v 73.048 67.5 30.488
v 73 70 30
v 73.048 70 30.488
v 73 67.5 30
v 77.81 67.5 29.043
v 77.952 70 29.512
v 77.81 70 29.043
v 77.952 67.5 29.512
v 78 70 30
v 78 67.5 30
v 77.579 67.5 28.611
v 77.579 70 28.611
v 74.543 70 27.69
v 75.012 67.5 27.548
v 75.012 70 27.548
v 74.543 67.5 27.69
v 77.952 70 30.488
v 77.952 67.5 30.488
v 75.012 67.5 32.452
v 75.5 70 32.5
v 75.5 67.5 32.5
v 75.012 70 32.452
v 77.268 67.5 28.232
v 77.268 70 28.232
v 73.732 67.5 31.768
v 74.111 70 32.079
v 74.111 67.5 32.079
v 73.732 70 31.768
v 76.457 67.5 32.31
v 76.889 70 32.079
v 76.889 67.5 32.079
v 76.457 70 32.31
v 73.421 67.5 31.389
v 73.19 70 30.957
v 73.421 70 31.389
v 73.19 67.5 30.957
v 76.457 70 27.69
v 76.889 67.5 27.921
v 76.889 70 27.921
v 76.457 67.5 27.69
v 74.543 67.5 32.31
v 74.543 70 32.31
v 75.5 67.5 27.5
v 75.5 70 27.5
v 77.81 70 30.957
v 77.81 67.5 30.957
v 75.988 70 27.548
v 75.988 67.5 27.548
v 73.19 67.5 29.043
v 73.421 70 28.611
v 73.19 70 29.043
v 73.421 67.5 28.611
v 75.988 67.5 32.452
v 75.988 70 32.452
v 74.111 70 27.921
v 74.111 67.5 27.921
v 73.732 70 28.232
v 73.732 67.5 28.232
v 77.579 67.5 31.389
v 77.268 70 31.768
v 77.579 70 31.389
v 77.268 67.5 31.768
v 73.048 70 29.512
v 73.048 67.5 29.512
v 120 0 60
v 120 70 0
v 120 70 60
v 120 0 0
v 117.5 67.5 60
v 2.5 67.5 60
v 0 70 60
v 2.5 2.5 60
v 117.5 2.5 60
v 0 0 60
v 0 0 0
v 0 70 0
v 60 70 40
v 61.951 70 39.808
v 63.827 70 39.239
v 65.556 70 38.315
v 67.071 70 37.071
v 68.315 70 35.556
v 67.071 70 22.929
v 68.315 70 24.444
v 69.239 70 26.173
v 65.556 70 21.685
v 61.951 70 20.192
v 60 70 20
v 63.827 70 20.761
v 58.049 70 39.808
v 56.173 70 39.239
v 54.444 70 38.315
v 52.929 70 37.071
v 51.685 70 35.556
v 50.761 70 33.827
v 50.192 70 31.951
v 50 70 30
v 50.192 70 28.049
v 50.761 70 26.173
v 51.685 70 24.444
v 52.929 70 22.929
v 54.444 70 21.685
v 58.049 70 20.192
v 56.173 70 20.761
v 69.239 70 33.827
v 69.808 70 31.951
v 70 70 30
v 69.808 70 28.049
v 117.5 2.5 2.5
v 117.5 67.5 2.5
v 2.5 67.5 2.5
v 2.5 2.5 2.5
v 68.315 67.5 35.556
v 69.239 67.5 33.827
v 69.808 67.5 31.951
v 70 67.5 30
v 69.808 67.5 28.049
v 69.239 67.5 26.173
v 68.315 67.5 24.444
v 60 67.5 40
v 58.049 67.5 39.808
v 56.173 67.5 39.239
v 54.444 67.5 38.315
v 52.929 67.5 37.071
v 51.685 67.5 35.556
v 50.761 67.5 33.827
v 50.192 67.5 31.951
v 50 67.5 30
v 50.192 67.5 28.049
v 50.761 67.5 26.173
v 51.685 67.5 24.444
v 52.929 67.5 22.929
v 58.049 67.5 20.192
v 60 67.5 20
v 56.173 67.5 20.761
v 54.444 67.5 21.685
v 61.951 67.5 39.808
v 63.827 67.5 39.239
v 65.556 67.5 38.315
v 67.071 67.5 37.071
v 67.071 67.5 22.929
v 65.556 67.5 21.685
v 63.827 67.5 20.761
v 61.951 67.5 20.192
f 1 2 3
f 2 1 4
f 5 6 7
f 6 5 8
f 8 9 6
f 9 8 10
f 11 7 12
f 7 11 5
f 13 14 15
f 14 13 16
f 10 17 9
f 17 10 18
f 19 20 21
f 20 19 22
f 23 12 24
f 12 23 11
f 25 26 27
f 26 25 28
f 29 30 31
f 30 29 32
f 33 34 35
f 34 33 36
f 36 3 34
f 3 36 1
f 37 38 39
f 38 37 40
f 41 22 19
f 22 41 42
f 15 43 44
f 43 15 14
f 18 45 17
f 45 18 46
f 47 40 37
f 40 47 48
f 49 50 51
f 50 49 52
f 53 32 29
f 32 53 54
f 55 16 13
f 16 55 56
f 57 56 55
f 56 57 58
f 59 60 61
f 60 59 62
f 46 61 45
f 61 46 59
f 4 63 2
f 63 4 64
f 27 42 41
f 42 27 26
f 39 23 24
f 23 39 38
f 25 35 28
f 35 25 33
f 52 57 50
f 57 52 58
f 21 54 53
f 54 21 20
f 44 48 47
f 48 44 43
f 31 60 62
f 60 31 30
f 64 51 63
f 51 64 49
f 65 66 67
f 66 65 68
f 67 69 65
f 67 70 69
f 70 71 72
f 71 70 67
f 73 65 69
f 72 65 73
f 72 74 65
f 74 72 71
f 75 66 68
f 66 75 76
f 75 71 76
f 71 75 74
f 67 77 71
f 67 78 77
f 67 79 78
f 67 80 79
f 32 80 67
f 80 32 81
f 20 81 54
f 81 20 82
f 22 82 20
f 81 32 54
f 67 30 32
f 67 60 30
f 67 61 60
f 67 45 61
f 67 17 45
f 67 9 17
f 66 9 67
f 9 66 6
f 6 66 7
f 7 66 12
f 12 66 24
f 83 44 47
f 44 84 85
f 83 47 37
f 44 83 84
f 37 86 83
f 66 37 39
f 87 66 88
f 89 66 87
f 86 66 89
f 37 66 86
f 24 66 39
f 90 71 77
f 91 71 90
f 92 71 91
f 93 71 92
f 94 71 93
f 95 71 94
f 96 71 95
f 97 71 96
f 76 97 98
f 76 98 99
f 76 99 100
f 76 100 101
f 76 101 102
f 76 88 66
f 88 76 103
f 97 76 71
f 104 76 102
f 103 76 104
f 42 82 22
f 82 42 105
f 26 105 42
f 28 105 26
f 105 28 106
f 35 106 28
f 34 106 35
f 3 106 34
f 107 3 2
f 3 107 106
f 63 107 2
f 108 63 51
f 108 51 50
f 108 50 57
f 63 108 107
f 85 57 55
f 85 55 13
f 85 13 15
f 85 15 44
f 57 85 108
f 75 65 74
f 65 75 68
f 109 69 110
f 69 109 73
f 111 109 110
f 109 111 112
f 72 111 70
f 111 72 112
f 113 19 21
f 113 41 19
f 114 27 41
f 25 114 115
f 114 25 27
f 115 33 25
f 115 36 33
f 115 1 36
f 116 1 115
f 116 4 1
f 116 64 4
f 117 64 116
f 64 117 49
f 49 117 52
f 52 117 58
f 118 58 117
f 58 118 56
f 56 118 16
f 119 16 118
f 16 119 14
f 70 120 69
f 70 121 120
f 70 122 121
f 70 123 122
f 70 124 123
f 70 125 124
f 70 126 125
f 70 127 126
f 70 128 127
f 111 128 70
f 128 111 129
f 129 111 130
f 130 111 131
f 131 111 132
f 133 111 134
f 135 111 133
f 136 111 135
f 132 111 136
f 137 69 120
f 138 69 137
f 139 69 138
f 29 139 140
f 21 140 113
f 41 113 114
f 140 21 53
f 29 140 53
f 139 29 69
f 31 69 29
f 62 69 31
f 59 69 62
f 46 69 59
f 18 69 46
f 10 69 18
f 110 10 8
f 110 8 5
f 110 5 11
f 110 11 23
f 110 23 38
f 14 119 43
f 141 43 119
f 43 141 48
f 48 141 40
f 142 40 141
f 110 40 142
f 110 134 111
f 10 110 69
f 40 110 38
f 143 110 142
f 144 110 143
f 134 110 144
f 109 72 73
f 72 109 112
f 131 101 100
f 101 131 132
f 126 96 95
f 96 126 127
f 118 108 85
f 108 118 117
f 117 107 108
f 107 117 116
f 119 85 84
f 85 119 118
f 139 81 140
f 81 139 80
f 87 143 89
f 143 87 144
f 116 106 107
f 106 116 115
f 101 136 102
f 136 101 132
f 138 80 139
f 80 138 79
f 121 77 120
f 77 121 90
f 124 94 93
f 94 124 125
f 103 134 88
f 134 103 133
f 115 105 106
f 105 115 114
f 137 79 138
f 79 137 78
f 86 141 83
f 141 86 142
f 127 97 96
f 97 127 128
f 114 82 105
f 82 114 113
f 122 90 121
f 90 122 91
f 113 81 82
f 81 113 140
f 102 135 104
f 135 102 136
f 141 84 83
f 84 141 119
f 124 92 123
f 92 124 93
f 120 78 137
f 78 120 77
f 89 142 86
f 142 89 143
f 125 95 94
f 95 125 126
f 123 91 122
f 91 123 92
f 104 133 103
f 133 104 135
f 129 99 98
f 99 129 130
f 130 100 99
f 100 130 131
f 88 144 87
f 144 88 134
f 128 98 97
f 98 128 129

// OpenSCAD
$fn = 32;

// ----------------------------------------------------------------------
// Vent box: roundvent enclosure
// ----------------------------------------------------------------------

// --- parameters (mm) ---
box_l = 120;              // box length, X
box_w = 70;               // box width, Y
box_h = 60;               // box height, Z
wall_t = 2.5;             // shell wall thickness
vent_d = 20;              // central vent diameter
ring_d = 5;               // ring hole diameter
n_ring = 8;               // holes in the ring
ring_r = 15.5;            // ring radius

ring_step = 360 / n_ring;  // ring hole angular step

difference() {
  cube([box_l, box_w, box_h]);
  translate([wall_t, wall_t, wall_t])
    cube([box_l - 2 * wall_t, box_w - 2 * wall_t, box_h]);
  translate([box_l / 2, box_w - wall_t - 1, box_h / 2])
    rotate([-90, 0, 0]) cylinder(h = wall_t + 2, d = vent_d);
  for (i = [0 : n_ring - 1])
    translate([box_l / 2, box_w - wall_t - 1, box_h / 2])
      rotate([0, 0, i * ring_step])
        translate([ring_r, 0, 0]) rotate([-90, 0, 0])
          cylinder(h = wall_t + 2, d = ring_d);
}
